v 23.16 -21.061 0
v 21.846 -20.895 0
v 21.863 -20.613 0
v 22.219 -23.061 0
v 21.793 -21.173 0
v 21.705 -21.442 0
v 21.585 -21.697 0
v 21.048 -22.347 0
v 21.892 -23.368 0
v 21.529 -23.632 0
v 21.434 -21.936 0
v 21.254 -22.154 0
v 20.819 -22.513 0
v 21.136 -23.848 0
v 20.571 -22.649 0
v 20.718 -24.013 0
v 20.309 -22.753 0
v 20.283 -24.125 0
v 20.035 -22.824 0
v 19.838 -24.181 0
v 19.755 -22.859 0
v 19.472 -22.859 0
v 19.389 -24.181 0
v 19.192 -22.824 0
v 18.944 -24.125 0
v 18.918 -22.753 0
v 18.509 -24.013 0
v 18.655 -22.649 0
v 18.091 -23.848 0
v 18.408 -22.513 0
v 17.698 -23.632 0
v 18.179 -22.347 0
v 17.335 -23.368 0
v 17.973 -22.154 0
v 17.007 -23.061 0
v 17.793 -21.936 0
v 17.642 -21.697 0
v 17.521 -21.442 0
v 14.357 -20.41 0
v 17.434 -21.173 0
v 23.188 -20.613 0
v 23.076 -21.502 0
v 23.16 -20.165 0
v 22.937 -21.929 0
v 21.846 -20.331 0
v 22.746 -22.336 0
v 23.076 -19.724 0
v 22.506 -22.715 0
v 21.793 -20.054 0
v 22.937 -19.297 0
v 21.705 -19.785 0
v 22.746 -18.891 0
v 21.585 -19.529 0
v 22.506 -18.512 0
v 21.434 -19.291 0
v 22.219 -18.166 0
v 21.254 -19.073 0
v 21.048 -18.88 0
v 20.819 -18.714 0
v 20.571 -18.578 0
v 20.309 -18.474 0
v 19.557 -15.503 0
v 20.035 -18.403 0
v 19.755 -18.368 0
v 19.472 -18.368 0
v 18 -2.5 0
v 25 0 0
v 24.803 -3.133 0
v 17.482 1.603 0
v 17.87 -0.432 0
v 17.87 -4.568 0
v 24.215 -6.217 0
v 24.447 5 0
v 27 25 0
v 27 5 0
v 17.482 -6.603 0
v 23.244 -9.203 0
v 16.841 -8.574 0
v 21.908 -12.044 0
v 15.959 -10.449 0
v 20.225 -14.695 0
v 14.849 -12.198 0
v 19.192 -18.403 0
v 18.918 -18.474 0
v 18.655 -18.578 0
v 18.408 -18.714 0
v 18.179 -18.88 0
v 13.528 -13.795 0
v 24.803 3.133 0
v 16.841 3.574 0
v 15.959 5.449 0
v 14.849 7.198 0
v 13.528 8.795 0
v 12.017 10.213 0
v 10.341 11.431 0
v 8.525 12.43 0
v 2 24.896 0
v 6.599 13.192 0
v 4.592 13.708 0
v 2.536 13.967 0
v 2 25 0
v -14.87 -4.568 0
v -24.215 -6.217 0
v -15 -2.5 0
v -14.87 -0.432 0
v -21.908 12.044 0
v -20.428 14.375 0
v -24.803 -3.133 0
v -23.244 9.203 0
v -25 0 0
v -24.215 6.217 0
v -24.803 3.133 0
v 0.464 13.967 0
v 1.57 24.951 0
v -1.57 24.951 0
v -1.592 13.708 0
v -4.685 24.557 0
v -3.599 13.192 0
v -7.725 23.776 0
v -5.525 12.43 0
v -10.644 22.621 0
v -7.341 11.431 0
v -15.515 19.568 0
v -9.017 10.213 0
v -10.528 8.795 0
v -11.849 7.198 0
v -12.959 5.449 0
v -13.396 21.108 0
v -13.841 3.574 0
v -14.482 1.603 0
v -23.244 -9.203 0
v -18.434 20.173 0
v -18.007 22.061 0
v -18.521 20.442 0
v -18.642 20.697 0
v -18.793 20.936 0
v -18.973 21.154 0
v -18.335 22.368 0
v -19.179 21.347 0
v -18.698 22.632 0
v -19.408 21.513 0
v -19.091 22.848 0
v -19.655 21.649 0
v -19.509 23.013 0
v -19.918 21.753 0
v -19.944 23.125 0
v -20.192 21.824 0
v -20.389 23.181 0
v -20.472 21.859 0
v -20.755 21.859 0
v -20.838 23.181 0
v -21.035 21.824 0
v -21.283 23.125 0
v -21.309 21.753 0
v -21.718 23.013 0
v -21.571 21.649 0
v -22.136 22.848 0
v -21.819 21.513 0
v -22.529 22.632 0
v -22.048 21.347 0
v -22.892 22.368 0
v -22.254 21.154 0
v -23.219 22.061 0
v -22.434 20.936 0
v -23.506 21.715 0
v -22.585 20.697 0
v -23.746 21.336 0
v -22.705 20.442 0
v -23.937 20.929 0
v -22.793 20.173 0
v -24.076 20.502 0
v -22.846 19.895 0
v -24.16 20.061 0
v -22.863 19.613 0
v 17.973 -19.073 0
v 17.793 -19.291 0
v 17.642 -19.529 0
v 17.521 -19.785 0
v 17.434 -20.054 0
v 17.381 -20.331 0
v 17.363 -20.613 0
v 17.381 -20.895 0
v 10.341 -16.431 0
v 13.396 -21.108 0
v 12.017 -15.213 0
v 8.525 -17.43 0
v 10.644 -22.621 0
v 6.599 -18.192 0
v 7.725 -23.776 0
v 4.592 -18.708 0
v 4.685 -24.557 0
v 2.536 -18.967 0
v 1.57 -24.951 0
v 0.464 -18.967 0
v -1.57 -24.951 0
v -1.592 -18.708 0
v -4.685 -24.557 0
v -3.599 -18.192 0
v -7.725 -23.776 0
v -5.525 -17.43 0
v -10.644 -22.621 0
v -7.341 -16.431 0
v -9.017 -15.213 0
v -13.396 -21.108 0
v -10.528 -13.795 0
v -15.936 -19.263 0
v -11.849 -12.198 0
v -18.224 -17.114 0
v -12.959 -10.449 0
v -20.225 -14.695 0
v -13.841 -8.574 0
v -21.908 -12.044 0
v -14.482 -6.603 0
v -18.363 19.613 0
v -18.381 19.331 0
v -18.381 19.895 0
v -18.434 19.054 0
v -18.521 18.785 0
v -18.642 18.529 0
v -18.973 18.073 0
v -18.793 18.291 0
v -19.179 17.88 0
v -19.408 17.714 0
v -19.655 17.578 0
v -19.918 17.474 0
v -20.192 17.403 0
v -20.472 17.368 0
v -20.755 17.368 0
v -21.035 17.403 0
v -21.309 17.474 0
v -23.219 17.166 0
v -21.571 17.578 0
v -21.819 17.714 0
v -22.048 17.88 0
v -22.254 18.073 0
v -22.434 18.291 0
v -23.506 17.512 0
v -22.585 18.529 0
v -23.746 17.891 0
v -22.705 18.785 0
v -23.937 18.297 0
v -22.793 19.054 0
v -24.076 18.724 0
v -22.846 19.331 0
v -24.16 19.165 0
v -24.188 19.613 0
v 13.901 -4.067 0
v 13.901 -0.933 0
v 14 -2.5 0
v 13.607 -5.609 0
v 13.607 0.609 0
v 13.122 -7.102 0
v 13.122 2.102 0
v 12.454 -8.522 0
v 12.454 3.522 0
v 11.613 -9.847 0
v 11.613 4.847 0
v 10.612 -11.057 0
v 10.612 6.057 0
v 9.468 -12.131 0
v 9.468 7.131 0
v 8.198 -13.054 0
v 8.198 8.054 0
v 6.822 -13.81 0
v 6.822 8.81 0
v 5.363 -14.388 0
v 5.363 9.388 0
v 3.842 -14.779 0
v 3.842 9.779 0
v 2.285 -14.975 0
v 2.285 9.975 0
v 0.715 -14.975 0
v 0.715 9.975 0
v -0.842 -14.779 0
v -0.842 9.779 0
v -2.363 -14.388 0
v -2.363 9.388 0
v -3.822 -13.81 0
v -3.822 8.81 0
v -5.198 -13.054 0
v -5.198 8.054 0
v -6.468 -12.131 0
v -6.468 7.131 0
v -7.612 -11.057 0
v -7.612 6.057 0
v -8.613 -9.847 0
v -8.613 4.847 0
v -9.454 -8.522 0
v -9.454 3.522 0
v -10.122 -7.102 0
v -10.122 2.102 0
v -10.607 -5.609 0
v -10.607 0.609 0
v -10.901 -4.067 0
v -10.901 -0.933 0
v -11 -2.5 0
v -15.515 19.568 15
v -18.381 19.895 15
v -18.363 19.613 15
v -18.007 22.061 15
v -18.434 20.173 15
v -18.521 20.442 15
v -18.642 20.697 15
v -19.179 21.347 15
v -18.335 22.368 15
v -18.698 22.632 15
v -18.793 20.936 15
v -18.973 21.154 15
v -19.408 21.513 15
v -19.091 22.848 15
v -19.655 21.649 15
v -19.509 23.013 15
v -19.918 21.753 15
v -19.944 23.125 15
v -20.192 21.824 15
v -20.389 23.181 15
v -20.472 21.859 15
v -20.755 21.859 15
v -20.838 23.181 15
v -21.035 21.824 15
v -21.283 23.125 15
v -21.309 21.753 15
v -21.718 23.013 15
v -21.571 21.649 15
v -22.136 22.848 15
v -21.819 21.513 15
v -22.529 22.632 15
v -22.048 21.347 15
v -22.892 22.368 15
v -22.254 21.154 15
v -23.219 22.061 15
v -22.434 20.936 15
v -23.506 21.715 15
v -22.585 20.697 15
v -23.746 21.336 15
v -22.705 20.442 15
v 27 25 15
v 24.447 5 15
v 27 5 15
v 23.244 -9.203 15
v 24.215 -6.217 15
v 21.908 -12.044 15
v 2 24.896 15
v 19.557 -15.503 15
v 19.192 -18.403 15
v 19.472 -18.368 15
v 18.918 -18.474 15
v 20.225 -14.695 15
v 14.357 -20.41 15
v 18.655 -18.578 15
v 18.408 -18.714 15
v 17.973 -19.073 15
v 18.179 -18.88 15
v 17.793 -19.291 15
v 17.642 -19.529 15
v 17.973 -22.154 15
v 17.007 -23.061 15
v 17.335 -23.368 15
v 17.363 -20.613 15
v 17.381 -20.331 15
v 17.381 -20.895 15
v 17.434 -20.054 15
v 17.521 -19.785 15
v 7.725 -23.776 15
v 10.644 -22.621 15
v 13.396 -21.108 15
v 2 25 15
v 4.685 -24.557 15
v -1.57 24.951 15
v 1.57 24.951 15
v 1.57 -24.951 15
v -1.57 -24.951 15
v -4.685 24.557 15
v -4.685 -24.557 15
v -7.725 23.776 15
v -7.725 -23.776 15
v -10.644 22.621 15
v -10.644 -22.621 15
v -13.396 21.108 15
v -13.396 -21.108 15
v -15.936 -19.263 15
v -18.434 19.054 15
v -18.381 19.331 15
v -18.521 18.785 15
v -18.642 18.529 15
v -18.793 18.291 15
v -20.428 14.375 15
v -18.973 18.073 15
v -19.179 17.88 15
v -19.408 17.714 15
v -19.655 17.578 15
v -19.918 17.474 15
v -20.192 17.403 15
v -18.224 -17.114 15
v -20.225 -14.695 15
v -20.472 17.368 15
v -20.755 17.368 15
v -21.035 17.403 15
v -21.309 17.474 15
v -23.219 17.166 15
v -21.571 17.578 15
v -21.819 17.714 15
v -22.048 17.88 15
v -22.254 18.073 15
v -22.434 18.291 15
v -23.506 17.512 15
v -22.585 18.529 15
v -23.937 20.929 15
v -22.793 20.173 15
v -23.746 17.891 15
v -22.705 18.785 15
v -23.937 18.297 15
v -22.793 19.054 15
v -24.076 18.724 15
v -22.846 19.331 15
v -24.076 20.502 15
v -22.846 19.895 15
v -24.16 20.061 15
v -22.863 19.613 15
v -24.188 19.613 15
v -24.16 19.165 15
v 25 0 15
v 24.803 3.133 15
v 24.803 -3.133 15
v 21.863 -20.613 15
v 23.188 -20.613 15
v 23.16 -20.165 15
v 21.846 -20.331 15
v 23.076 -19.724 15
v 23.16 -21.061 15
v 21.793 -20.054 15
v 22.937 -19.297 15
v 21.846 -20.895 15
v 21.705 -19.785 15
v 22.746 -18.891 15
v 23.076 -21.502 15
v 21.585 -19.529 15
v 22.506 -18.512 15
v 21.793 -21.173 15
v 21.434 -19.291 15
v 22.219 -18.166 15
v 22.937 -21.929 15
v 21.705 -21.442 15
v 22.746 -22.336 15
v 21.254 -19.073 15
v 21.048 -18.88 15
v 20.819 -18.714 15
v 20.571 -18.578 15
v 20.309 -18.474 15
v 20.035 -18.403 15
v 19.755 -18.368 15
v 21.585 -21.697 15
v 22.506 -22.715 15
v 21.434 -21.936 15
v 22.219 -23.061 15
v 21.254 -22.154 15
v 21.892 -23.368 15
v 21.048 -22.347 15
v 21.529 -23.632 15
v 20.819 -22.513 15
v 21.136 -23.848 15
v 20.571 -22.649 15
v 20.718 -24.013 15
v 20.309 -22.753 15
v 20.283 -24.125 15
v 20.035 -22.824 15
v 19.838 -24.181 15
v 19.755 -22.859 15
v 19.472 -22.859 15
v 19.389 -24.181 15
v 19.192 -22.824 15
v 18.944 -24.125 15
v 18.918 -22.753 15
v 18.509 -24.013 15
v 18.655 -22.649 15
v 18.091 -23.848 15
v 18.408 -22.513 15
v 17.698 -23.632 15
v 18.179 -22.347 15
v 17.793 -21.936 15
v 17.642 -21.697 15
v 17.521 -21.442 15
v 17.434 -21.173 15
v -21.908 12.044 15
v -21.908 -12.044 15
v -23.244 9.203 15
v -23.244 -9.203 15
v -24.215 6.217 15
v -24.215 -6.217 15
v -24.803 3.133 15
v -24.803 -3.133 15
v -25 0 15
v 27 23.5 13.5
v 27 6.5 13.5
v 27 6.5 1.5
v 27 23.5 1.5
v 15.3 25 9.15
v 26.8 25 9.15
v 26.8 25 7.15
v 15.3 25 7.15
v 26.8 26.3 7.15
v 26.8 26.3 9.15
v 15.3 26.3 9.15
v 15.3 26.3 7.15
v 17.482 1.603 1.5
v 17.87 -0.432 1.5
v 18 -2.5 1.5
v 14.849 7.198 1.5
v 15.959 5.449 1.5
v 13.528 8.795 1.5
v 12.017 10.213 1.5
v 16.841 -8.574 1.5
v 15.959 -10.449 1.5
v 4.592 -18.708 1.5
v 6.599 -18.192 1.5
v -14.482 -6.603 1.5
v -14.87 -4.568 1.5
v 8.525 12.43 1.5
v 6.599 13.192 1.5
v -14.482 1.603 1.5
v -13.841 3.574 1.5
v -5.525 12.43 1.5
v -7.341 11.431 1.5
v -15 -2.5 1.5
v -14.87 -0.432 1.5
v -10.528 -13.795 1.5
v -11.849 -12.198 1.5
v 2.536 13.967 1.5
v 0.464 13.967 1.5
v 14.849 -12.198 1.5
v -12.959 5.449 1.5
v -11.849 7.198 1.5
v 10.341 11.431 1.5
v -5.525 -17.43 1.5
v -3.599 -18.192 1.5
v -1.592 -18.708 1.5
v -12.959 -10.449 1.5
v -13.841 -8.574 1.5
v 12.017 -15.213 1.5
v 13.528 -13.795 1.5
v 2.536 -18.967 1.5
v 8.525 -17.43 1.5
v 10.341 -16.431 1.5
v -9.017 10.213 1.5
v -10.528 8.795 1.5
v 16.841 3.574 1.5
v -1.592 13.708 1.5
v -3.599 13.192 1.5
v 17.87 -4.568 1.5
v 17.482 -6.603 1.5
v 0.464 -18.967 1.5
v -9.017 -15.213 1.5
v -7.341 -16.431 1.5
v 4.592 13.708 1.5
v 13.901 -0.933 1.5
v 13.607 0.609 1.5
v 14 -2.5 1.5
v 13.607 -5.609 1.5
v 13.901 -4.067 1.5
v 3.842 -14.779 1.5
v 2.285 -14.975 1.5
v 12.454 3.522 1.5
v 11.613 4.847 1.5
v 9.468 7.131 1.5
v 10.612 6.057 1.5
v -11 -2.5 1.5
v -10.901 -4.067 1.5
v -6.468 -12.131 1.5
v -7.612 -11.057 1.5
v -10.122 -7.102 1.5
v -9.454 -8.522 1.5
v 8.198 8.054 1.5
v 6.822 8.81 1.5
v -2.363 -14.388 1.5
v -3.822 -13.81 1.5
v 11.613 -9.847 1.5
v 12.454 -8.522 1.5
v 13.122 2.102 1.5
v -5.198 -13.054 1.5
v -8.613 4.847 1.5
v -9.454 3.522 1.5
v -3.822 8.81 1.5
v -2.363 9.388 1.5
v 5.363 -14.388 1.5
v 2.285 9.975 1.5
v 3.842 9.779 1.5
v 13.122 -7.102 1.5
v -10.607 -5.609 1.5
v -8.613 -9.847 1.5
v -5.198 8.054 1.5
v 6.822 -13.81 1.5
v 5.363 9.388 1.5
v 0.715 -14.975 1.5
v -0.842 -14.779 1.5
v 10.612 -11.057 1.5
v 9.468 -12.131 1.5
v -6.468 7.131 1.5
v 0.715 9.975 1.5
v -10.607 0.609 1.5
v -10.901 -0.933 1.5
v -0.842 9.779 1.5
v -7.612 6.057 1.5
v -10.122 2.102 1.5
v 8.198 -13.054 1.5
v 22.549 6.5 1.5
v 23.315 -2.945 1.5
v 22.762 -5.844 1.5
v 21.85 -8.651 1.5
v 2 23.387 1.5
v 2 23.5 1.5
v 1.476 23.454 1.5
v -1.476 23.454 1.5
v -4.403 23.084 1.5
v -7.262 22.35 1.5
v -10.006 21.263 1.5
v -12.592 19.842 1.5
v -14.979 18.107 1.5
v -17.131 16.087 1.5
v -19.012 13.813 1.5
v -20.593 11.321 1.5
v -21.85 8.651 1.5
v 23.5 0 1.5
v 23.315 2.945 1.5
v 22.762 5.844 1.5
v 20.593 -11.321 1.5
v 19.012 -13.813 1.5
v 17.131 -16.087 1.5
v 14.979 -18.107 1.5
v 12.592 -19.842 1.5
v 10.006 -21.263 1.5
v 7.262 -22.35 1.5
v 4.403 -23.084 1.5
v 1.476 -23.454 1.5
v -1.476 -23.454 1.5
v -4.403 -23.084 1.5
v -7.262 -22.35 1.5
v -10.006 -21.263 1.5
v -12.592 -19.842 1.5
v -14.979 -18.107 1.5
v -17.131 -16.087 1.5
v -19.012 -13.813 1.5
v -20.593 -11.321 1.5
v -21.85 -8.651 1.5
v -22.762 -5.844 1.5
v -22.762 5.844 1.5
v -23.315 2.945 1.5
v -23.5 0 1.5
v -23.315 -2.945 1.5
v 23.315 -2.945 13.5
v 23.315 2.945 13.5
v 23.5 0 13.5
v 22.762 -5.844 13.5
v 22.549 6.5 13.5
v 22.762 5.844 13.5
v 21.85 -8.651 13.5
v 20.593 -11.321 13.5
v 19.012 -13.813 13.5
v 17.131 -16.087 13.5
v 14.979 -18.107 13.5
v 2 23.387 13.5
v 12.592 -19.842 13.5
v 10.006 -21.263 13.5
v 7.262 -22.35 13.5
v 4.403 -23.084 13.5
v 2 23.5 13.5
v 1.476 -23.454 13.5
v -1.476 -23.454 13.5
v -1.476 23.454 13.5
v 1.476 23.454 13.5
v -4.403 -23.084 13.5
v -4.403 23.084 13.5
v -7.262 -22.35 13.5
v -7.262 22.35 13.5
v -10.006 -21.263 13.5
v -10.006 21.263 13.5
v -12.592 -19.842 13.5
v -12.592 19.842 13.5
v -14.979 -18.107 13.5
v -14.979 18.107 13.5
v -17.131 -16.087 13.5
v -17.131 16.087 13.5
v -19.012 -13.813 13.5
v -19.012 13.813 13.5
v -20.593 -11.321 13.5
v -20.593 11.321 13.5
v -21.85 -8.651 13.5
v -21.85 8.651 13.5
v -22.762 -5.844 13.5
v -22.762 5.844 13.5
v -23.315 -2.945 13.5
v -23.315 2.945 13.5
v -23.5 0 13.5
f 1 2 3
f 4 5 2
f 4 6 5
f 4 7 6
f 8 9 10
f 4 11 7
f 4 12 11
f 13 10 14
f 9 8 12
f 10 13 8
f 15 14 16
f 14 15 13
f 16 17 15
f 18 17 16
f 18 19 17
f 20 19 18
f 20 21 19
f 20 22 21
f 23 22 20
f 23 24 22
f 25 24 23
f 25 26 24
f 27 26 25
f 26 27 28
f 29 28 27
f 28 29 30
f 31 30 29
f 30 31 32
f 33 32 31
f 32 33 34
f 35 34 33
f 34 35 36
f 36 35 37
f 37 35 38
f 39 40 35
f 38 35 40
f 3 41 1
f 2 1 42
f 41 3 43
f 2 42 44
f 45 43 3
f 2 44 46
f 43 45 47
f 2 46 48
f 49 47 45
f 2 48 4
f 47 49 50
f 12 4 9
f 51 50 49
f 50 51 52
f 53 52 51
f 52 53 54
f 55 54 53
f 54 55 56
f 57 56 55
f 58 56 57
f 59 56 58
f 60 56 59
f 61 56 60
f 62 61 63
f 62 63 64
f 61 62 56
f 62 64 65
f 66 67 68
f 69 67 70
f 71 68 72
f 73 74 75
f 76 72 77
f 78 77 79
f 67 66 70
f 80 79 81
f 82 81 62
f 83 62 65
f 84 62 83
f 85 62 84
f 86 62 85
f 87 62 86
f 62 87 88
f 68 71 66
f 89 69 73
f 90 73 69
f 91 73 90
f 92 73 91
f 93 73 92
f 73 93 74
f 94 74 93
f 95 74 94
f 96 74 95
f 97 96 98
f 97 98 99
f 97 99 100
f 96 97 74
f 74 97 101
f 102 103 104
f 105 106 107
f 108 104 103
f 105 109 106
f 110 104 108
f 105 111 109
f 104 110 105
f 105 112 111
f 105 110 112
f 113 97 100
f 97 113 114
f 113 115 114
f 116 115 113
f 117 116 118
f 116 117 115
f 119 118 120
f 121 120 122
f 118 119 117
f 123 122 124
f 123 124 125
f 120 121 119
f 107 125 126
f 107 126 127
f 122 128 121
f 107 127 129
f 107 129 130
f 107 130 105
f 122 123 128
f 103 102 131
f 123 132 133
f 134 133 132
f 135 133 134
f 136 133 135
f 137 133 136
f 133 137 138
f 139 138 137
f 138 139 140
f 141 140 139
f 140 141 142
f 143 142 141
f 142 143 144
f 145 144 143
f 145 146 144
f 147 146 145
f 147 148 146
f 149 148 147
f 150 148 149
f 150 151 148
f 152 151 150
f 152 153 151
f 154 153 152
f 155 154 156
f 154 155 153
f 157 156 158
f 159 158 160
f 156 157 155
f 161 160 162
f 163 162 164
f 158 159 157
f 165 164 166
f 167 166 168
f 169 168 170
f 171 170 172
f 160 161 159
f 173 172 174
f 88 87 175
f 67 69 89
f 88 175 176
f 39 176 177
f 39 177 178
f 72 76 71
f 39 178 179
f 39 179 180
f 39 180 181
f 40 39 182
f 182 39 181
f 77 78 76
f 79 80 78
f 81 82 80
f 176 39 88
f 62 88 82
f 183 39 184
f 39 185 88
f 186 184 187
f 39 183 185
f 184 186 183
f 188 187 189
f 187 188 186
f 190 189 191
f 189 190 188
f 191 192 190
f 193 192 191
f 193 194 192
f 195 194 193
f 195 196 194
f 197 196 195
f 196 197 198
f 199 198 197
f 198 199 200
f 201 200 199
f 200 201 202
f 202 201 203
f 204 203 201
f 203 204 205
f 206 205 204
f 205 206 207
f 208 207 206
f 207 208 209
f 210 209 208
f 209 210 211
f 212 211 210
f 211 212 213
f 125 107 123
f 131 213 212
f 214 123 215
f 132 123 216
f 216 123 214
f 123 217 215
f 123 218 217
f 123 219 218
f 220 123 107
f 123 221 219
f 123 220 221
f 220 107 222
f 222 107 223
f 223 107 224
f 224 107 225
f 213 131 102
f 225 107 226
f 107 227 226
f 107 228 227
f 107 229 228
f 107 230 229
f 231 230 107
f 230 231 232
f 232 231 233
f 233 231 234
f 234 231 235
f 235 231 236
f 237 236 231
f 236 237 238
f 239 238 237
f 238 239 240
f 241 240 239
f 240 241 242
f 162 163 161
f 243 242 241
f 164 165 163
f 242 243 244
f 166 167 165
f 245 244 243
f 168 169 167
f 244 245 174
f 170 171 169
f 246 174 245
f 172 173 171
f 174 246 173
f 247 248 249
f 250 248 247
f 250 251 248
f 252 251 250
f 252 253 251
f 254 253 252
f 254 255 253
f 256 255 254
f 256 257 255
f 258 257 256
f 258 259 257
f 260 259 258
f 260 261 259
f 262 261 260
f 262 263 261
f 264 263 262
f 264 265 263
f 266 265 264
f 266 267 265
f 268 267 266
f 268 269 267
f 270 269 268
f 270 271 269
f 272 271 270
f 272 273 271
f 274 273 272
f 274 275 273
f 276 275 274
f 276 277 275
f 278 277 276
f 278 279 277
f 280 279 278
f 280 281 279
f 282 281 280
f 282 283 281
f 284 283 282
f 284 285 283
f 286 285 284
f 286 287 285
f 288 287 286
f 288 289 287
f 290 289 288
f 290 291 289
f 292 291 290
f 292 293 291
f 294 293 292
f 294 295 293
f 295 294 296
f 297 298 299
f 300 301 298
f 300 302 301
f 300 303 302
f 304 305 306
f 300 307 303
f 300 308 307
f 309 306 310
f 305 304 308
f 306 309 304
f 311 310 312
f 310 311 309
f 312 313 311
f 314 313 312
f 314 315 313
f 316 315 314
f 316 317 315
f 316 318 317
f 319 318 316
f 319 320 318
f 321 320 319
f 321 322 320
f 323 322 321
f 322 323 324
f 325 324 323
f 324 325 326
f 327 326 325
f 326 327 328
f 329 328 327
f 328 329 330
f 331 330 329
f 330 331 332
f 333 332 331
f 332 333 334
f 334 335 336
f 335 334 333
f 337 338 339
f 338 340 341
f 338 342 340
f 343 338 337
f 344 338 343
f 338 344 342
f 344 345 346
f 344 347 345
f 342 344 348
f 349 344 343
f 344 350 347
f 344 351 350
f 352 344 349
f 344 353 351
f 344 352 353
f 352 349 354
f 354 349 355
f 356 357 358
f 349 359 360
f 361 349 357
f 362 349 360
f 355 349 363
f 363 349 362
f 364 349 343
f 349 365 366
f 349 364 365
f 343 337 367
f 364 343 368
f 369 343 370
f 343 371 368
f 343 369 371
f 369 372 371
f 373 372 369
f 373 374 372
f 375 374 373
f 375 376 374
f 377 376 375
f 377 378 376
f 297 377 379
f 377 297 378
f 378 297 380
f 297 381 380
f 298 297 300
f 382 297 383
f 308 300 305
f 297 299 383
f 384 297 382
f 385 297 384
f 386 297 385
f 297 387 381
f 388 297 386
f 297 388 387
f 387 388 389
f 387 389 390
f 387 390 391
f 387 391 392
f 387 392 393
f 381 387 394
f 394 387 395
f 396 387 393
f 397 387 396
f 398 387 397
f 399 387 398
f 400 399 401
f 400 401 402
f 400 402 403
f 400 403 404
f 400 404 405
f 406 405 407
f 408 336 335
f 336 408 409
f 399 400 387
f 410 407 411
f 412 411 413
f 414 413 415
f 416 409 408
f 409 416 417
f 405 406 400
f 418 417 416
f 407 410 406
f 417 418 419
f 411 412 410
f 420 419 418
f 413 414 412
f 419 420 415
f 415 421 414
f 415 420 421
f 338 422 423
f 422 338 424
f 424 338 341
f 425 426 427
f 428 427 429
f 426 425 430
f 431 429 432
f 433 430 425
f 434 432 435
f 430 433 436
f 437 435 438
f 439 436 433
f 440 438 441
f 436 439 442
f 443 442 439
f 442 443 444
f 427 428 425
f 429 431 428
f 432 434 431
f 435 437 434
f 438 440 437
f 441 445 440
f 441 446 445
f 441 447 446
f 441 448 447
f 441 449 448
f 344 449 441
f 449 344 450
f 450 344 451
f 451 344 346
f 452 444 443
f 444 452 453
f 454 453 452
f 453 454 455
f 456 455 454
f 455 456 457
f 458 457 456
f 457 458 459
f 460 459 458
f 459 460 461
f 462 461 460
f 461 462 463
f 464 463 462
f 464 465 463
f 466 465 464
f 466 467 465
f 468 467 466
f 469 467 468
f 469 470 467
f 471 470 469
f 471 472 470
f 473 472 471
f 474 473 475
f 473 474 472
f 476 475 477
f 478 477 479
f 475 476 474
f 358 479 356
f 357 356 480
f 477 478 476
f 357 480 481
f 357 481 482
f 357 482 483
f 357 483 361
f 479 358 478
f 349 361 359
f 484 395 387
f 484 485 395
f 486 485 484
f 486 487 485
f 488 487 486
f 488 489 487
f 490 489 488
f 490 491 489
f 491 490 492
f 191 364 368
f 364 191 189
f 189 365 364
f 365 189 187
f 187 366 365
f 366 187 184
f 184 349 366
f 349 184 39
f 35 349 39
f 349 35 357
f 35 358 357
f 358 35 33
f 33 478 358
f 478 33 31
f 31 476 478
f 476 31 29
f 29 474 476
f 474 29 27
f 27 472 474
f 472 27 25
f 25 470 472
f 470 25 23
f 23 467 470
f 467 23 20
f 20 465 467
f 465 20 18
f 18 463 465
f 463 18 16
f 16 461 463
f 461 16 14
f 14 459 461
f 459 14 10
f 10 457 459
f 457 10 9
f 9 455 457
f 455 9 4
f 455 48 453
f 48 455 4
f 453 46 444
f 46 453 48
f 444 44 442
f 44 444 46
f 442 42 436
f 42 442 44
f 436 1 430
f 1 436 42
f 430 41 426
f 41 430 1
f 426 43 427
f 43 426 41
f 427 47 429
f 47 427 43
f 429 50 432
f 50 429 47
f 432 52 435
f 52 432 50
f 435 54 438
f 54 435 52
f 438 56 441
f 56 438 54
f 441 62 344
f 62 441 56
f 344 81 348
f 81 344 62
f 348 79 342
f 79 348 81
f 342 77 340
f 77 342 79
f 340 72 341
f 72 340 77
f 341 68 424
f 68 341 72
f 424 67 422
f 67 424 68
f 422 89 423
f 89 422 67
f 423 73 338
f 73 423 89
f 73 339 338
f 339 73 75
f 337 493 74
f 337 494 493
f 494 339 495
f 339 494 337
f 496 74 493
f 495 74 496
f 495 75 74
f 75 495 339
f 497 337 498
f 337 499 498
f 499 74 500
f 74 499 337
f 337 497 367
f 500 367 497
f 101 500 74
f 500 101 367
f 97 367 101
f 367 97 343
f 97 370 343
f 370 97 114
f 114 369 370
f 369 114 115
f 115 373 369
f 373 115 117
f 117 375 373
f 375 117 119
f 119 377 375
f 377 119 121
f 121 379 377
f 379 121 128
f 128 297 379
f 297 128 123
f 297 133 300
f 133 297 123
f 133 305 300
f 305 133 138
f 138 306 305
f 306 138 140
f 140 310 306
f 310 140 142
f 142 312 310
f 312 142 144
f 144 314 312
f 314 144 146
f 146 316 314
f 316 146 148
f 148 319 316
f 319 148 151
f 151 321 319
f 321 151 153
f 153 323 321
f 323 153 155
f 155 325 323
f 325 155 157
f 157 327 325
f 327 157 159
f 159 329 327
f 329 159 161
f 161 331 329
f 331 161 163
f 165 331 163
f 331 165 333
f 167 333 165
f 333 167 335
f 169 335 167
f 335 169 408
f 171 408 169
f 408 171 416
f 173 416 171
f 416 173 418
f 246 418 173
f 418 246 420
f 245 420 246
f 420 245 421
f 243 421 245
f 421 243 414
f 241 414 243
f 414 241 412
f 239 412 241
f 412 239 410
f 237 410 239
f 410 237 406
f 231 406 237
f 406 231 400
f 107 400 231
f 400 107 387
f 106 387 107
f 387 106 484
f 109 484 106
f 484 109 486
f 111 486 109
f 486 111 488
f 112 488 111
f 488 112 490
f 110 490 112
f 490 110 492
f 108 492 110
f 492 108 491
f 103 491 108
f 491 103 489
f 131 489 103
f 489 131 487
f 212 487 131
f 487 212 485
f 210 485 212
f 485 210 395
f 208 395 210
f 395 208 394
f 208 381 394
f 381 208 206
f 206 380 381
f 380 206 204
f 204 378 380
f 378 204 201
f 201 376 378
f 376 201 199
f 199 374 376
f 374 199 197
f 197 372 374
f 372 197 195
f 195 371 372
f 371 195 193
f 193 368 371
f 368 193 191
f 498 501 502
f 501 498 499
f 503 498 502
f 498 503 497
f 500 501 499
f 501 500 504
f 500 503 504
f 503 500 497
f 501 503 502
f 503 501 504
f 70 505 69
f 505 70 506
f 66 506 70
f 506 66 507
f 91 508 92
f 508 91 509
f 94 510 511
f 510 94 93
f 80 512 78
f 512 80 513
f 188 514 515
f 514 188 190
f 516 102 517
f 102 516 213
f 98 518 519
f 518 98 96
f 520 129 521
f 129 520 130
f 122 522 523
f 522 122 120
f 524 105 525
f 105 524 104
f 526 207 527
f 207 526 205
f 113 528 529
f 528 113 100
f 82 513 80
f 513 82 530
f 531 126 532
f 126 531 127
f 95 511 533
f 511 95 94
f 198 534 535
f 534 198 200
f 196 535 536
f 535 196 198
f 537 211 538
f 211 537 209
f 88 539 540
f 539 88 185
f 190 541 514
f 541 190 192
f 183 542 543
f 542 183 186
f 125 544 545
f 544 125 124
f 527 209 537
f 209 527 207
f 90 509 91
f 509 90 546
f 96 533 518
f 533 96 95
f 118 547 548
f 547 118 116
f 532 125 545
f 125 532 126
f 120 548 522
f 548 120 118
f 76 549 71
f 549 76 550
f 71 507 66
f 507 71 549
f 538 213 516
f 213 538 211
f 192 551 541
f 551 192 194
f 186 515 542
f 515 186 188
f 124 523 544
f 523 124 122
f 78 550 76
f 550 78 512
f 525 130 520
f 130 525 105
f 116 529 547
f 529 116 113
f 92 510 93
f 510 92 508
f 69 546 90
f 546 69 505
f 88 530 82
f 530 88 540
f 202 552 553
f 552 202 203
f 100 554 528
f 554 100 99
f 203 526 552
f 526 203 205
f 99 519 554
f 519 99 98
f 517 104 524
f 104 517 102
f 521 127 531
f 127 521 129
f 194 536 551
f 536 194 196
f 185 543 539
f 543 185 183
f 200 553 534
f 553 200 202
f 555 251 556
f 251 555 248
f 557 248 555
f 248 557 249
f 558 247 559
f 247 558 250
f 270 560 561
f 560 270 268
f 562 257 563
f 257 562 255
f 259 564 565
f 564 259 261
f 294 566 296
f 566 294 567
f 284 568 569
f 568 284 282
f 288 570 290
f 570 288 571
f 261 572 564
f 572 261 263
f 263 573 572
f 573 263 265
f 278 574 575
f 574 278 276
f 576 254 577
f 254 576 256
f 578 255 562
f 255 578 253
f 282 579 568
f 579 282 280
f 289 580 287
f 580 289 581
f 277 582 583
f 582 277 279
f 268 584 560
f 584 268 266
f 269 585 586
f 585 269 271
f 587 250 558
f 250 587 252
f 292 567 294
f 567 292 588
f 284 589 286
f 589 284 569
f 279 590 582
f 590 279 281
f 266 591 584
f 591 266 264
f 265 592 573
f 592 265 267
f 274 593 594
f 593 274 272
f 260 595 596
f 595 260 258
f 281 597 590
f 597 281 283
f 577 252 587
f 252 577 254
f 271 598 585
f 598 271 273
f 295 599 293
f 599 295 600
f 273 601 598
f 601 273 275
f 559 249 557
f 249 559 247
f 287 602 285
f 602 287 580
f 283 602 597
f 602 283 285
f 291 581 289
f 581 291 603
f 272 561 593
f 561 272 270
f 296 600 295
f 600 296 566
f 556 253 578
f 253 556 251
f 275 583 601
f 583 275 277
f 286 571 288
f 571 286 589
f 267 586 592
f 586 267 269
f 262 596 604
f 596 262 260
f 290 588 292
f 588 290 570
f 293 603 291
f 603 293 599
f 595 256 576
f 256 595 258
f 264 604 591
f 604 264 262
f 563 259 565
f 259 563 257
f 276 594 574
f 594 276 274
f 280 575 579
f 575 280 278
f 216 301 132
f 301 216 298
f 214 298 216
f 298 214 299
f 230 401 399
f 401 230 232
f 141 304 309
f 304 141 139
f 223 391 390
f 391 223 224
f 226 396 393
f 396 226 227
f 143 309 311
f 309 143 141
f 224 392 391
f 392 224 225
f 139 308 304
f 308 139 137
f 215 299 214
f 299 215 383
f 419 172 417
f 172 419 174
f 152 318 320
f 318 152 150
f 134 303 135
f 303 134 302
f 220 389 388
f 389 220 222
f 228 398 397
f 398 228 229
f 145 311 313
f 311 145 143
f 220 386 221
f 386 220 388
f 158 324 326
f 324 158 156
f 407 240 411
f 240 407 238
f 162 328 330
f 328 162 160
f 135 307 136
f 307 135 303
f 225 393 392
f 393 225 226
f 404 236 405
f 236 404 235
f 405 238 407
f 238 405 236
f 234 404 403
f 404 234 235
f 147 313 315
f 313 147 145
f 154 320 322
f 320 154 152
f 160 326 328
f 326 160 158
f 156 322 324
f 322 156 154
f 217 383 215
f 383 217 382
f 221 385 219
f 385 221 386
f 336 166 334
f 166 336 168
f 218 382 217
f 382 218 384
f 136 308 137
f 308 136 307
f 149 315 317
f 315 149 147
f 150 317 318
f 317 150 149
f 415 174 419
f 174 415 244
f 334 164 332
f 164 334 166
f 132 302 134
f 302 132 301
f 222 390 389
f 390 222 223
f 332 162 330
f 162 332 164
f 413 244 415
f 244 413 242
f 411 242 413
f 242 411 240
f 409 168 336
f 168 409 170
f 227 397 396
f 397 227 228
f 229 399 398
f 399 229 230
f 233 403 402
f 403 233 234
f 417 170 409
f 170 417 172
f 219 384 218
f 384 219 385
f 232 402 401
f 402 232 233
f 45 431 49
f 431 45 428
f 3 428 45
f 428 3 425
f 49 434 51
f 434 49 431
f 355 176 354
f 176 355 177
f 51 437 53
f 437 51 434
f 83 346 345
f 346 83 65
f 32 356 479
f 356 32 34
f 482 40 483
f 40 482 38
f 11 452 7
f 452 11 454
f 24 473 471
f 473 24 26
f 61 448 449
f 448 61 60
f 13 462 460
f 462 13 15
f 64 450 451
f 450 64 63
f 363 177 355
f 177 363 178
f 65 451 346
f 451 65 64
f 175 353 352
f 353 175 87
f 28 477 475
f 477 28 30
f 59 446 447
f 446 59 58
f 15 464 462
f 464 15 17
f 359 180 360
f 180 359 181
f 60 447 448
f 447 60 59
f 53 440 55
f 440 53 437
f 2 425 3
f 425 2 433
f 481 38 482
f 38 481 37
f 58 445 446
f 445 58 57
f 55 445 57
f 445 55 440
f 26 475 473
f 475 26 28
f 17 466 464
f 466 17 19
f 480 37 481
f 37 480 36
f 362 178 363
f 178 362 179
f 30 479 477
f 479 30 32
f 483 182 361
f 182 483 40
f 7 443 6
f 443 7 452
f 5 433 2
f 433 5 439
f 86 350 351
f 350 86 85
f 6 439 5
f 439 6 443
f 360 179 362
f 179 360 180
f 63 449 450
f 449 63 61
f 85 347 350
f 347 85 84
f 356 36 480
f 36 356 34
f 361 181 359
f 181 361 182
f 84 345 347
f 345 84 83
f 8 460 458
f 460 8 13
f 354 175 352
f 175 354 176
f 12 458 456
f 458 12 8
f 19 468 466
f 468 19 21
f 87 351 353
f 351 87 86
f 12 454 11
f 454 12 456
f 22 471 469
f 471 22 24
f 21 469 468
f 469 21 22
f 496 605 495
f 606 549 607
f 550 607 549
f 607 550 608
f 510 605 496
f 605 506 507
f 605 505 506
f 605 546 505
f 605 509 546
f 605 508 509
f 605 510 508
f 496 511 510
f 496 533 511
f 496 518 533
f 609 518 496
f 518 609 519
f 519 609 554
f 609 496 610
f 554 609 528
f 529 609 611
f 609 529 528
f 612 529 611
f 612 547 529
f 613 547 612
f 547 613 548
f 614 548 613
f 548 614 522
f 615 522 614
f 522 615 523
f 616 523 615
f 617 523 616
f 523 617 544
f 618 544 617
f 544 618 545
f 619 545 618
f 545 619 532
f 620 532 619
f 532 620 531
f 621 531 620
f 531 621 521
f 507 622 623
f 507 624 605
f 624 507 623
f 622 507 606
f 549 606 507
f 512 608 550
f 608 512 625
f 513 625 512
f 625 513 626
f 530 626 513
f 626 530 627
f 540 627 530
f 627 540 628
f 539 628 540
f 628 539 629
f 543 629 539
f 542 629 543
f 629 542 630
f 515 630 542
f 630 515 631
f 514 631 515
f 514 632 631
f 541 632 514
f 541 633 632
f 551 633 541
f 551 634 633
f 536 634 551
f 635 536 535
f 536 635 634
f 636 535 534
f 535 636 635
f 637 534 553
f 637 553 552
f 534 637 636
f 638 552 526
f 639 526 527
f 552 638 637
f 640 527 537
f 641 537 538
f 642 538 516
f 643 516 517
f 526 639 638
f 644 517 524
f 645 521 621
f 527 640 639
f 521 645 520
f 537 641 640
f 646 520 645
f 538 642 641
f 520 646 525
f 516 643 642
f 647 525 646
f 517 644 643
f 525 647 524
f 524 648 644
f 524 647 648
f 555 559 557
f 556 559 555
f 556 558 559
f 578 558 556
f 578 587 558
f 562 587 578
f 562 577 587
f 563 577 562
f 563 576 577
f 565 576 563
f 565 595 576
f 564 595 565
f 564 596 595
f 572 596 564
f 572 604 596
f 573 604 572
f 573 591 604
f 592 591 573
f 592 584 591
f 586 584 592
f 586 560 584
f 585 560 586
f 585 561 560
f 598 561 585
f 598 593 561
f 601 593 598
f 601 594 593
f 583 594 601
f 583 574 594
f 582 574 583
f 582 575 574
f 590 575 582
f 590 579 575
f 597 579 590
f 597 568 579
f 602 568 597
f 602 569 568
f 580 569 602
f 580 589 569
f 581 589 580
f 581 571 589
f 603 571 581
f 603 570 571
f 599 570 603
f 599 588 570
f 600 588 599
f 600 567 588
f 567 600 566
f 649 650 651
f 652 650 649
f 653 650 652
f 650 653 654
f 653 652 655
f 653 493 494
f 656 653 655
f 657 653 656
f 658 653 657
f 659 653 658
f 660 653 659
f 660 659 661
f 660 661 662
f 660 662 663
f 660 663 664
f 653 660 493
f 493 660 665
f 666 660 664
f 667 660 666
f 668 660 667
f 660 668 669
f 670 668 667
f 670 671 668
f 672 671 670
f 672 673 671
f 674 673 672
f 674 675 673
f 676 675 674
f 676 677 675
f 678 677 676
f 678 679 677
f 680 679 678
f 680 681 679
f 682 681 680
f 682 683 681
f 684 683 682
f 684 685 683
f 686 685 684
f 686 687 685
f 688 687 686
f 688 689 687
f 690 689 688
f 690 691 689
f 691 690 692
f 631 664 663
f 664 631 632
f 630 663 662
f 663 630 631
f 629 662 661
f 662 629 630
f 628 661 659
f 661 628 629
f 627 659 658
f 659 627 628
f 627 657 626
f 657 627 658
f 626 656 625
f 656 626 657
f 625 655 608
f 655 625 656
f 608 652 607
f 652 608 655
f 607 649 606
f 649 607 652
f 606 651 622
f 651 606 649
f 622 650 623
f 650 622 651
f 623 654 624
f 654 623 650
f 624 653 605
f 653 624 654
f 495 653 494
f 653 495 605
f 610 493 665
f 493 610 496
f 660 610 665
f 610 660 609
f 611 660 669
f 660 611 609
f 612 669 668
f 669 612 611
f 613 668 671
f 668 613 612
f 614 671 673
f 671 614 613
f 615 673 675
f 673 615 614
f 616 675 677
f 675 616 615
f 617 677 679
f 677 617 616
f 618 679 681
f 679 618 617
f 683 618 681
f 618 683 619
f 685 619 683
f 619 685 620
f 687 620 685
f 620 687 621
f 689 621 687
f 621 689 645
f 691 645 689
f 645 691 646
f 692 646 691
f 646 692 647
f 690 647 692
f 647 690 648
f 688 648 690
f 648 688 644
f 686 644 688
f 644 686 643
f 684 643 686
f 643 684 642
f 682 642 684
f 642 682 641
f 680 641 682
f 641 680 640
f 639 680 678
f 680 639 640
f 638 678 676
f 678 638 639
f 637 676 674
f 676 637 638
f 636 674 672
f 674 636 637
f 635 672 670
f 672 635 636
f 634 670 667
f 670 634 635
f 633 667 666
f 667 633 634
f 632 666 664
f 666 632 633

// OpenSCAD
// Copyright 2017 Pavel Penev
// https://www.thingiverse.com/pavpen/about
//
// You can use this file under Attribution-ShareAlike 4.0 International
// (CC BY-SA 4.0).
//
// If you need to use it under another license, send me a message.

body_outer_r = 50 / 2;
outer_thickness = 15;
wall_thickness = 1.5;
rotor_axle_outer_r = 25 / 2;
rotor_center_offset = [1.5, -2.5];
intake_slit_width = 4;
intake_slit_depth = 10;
outlet_h = 20;
outlet_protrusion = 2;
mount_flap_outer_r = 7.15 / 2;
mount_hole_r = 4.5 / 2;
   
mount_hole_perimeter_points =
    pro_pavpen_radial_cooling_fan_mount_hole_perimeter_points();
mount_hole_centers = [
    mount_hole_perimeter_points[0] - [1 / sqrt(2), -1 / sqrt(2)] * mount_flap_outer_r,
    mount_hole_perimeter_points[1] + [1 / sqrt(2), -1 / sqrt(2)] * mount_flap_outer_r
];

outlet_seam_length = 11.5;
outlet_seam_width = 2;
outlet_seam_h = 1.3;
outlet_seam_offset_from_edge = 0.2;
outlet_seam_offset_from_top = 5.85;


$fn = 50;

function pro_pavpen_radial_cooling_fan_mount_hole_perimeter_points() =
    let (n = [1, -1],
         c = rotor_center_offset,
         r = body_outer_r,
         a = c[0] * n[0] + c[1] * n[1],
         d = n[0] * n[0] + n[1] * n[1],
         b = a - d * (c[0] * c[0] + c[1] * c[1] - r * r),
         t = [(-a - sqrt(b)) / d, (-a + sqrt(b)) / d])
    [
        [c[0] + n[0] * t[0], c[1] + n[1] * t[0]],
        [c[0] + n[0] * t[1], c[1] + n[1] * t[1]]
    ];


// Export functions:

function pro_pavpen_radial_cooling_fan_body_outer_r() = body_outer_r;

function pro_pavpen_radial_cooling_fan_outer_thickness() = outer_thickness;

function pro_pavpen_radial_cooling_fan_outlet_h() = outlet_h;

function pro_pavpen_radial_cooling_fan_outlet_protrusion() =
    outlet_protrusion;

function pro_pavpen_radial_cooling_fan_outlet_seam_length() =
    outlet_seam_length;

function pro_pavpen_radial_cooling_fan_outlet_seam_width() =
    outlet_seam_width;

function pro_pavpen_radial_cooling_fan_outlet_seam_h() = outlet_seam_h;

function pro_pavpen_radial_cooling_fan_outlet_seam_offset_from_edge() =
    outlet_seam_offset_from_edge;



// Demo:
pro_pavpen_radial_cooling_fan();


module pro_pavpen_radial_cooling_fan()
{
    difference()
    {
        pro_pavpen_radial_cooling_fan_outline();
        pro_pavpen_radial_cooling_fan_holes();
    }
}

module pro_pavpen_radial_cooling_fan_outline()
{
    union()
    {
        linear_extrude(outer_thickness)
        union()
        {
            // Body:
            circle(r = body_outer_r);
            
            // Outlet:
            translate([
                outlet_protrusion,
                body_outer_r - outlet_h])
            square([body_outer_r, outlet_h]);
            
            // Mount flaps:
            hull()
            {
                for (xy = mount_hole_centers)
                {
                    translate([xy[0], xy[1], 0])
                    circle(r = mount_flap_outer_r);
                }
            }
        }
        
        // Intake seam:
        pro_pavpen_radial_cooling_fan_position_as_outlet_seam()
        pro_pavpen_radial_cooling_fan_outlet_seam();
    }
}

module pro_pavpen_radial_cooling_fan_holes(
    extend_top_h = 1,
    extend_bottom_h = 1,
    extend_right_h = 1
)
{
    union()
    {
        // Intake slit:
        translate([
            rotor_center_offset[0],
            rotor_center_offset[1],
            -extend_bottom_h])
        difference()
        {
            cylinder(
                r = rotor_axle_outer_r + intake_slit_width,
                h = intake_slit_depth + extend_bottom_h);

            translate([0, 0, -1])
            cylinder(
                r = rotor_axle_outer_r,
                h = intake_slit_depth + extend_bottom_h + 2);
        }
        
        // Mount flap holes:
        for (xy = mount_hole_centers)
        {
            translate([xy[0], xy[1], -extend_bottom_h])
            cylinder(
                r = mount_hole_r,
                h = outer_thickness + extend_bottom_h + extend_top_h);
        }
        
        // Body:
        translate([0, 0, wall_thickness])
        linear_extrude(outer_thickness - 2 * wall_thickness)
        union()
        {
            // Body:
            circle(r = body_outer_r - wall_thickness);
            
            // Outlet:
            translate([
                outlet_protrusion,
                body_outer_r - outlet_h + wall_thickness])
            square([
                body_outer_r + extend_right_h,
                outlet_h - 2 * wall_thickness]);
        }
    }
}

module pro_pavpen_radial_cooling_fan_position_as_outlet_seam()
{
    translate([
        body_outer_r + outlet_protrusion - outlet_seam_length - outlet_seam_offset_from_edge,
        body_outer_r,
        outer_thickness - outlet_seam_width - outlet_seam_offset_from_top])
    children();
}

module pro_pavpen_radial_cooling_fan_outlet_seam()
{
    cube([
        outlet_seam_length,
        outlet_seam_h,
        outlet_seam_width]);
}
